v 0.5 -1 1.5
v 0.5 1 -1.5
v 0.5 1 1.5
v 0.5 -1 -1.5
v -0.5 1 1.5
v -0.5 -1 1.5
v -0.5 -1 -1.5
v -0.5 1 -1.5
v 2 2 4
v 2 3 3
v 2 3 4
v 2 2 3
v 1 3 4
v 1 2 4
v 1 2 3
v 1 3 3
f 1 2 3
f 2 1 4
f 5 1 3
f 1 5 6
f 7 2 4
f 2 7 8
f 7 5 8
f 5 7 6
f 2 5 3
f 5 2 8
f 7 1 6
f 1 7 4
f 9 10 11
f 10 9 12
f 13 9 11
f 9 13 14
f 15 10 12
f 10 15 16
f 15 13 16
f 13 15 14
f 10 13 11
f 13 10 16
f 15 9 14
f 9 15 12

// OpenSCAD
m = [
  [1, 0, 0],
  [0, 1, 0],

  [0, 0, 1]
];
flat = [[1, 0, 0], [0, 1, 0]];
pts = [
  0, 1, 2, 3, 4, 5, 6, 7, 8, 9, 10, 11, 12, 13, 14, 15, 16, 17, 18, 19, 20, 21, 22, 23, 24, 25, 26,
  27, 28, 29, 30, 31, 32, 33, 34, 35, 36, 37, 38, 39, 40,
  41, 42
];
cube(
  [1, 2, 3],
  center = true
);
translate([
  1, 2, 3
])
  cube(1);
